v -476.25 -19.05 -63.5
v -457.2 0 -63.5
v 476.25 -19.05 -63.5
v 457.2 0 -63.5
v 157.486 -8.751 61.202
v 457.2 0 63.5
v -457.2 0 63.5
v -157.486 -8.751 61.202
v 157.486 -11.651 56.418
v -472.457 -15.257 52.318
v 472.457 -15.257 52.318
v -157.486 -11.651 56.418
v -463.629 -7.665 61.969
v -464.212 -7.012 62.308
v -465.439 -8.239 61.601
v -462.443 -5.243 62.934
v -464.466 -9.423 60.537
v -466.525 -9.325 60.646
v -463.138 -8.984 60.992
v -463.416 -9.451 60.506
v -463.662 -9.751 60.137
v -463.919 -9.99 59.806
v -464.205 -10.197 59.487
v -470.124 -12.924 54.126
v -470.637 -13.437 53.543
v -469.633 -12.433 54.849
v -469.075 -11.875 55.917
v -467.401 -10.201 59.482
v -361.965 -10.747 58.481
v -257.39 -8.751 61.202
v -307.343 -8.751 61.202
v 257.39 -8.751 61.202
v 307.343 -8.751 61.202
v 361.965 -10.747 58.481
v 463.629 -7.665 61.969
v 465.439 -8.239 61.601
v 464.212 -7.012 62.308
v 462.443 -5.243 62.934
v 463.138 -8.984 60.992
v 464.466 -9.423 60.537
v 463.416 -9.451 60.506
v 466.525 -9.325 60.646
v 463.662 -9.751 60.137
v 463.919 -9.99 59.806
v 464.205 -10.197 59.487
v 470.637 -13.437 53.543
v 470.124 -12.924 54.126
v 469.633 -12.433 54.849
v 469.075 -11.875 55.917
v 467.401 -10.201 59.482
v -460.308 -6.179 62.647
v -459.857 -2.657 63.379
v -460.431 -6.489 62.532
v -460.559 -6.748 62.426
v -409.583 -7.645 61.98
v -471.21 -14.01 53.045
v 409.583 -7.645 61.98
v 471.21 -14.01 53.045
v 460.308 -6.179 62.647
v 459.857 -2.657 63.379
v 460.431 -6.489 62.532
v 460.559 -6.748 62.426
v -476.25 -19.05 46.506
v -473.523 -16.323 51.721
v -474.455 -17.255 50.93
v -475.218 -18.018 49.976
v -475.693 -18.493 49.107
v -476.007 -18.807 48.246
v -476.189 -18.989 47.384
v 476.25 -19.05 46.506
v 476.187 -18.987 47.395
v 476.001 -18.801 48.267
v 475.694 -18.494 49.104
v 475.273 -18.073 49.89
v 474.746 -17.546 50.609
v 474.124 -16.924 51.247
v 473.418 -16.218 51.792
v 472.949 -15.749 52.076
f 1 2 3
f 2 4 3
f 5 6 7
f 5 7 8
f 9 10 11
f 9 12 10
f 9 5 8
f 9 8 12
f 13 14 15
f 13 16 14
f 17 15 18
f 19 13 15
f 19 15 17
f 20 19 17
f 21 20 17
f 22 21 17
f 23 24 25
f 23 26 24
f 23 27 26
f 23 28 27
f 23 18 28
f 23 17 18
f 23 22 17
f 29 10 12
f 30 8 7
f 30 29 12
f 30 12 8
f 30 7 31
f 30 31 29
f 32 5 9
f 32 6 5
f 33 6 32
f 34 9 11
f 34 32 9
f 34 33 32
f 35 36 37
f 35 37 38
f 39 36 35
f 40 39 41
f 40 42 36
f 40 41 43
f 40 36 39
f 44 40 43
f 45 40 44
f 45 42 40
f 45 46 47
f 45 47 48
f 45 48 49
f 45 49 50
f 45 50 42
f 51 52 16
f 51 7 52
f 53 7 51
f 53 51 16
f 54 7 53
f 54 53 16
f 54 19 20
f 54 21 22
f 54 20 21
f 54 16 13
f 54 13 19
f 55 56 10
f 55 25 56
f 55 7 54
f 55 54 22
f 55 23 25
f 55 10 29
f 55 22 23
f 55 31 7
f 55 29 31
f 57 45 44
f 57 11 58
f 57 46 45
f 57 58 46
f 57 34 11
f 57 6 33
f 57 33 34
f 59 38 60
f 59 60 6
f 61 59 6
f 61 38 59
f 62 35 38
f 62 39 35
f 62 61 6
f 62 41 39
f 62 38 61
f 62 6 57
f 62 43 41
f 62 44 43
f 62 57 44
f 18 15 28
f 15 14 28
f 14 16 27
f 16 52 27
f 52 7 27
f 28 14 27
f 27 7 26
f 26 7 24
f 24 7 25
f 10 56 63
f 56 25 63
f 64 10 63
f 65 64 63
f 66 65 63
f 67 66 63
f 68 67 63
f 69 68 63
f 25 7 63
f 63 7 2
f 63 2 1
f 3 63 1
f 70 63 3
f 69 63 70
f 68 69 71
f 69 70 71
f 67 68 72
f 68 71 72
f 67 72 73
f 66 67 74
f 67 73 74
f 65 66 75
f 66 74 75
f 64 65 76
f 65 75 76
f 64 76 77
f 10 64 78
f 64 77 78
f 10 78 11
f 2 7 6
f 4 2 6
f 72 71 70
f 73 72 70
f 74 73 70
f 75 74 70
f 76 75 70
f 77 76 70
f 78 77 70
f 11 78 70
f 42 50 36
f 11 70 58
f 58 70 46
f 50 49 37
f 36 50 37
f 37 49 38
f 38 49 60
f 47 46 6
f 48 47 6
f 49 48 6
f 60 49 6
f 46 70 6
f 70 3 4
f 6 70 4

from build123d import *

# Parameters (mm, degrees)
F0_W     = 952.5
F0_H     = 127
F1_DEPTH = 19.05
F3_DEPTH = 952.501
F5_DEPTH = 127.0010001


with BuildPart() as f1:
    # F0 (on Front) → F1 (new body)
    with BuildSketch(Plane.XZ):
        Rectangle(F0_W, F0_H)
    extrude(amount=F1_DEPTH)

    # F2 (on face) → F3 (cut, through all)
    with BuildSketch(Plane.YZ.offset(476.25)):
        with BuildLine():
            add(Edge.make_bspline(
                [(0, 63.5), (-13.8609133718, 63.5), (-9.1129885479, 55.0204556119), (-15.256598862, 52.3182653746)],
                knots=[0, 0, 0, 0, 19.4568359991, 19.4568359991, 19.4568359991, 19.4568359991], degree=3))
            Line((0, 63.5), (-19.05, 63.5))
            Line((-19.05, 63.5), (-19.05, 51.528967917))
            add(Edge.make_bspline(
                [(-15.256598862, 52.3182653746), (-16.2172018341, 51.8957561593), (-17.4440793365, 51.6144907855), (-19.05, 51.528967917)],
                knots=[19.4568359991, 19.4568359991, 19.4568359991, 19.4568359991, 22.4990690726, 22.4990690726, 22.4990690726, 22.4990690726], degree=3))
        make_face()
        with BuildLine():
            ThreePointArc((-19.05, 46.505666794), (-18.0177487141, 49.976120455), (-15.256598862, 52.3182653746))
            add(Edge.make_bspline(
                [(-15.256598862, 52.3182653746), (-16.2172018341, 51.8957561593), (-17.4440793365, 51.6144907855), (-19.05, 51.528967917)],
                knots=[19.4568359991, 19.4568359991, 19.4568359991, 19.4568359991, 22.4990690726, 22.4990690726, 22.4990690726, 22.4990690726], degree=3))
            Line((-19.05, 51.528967917), (-19.05, 46.505666794))
        make_face()
    extrude(amount=-F3_DEPTH, mode=Mode.SUBTRACT)

    # F4 (on face) → F5 (cut, through all)
    with BuildSketch(Plane(origin=(0, 0, -63.5), x_dir=(1, 0, 0), z_dir=(0, 0, -1))):
        Polygon((-457.2, 0), (-476.25, 19.05), (-476.25, 0), align=None)
        Polygon((476.25, 19.05), (457.2, 0), (476.25, 0), align=None)
    extrude(amount=-F5_DEPTH, mode=Mode.SUBTRACT)


solid = f1.part
